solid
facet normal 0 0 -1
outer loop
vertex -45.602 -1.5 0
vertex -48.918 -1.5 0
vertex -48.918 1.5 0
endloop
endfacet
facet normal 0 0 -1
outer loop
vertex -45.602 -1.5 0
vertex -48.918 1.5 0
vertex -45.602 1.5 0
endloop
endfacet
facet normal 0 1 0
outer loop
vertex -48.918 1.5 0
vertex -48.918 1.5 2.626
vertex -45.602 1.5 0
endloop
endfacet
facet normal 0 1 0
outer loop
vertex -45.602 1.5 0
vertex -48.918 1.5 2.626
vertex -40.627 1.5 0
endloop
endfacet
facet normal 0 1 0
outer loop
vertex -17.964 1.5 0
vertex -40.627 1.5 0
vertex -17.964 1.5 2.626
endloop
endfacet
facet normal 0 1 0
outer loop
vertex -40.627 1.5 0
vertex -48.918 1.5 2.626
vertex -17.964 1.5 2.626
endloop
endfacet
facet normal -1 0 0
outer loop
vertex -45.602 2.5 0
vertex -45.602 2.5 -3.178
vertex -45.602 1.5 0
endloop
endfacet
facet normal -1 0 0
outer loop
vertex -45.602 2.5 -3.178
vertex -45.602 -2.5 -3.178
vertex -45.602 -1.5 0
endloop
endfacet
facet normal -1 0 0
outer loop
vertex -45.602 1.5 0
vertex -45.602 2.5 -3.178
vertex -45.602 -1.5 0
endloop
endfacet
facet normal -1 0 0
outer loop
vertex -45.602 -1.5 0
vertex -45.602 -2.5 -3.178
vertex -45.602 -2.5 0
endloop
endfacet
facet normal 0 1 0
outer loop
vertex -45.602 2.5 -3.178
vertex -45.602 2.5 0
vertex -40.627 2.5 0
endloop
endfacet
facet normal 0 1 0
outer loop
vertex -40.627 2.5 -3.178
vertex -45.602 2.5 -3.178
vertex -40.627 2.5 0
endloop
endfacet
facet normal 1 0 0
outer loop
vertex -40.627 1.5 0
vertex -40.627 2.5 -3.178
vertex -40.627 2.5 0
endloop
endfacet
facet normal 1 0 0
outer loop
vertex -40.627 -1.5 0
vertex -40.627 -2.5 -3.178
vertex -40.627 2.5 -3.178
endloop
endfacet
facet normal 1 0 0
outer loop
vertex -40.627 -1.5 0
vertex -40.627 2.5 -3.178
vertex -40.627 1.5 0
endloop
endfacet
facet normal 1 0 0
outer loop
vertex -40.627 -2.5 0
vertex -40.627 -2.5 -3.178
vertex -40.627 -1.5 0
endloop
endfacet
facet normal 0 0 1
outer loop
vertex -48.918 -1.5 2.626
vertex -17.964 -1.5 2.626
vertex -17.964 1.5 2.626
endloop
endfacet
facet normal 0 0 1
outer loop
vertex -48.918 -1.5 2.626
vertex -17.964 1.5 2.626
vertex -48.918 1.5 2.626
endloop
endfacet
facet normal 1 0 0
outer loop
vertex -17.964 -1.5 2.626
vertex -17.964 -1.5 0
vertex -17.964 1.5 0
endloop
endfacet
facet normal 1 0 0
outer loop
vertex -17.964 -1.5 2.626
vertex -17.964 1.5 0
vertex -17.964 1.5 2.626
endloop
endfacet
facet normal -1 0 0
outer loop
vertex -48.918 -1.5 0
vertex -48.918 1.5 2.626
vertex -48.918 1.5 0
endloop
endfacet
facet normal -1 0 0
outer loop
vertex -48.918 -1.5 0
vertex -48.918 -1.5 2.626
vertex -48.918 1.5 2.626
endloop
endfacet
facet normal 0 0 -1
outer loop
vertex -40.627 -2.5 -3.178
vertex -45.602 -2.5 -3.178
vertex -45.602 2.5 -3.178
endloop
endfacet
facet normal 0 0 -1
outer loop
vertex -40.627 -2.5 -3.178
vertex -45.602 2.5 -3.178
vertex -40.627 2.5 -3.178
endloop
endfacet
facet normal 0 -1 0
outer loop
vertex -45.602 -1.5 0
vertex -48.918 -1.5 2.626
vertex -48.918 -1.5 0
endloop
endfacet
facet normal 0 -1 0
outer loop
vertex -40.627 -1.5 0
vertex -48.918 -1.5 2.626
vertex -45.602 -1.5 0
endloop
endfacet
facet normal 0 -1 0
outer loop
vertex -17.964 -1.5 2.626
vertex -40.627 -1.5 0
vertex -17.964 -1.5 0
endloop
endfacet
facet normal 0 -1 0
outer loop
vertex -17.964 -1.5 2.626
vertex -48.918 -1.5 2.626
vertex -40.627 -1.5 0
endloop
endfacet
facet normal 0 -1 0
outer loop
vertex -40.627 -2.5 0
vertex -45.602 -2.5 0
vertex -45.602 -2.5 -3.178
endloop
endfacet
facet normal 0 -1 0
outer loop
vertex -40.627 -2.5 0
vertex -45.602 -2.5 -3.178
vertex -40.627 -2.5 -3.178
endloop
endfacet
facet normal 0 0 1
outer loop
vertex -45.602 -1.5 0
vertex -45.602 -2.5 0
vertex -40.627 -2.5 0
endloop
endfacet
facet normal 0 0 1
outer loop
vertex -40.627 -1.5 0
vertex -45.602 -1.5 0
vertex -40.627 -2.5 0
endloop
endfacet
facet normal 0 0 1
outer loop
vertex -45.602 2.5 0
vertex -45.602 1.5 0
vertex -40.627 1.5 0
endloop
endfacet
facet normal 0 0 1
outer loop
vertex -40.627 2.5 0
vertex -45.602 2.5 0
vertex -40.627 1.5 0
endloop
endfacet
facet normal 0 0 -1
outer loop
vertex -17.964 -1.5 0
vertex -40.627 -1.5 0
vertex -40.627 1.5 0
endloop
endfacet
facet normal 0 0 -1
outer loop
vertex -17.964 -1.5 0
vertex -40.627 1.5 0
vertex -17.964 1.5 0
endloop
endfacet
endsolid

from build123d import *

# Parameters (mm, degrees)
F1_DEPTH = 1.5
F2_W     = 4.974715
F2_H     = 3.17829
F3_DEPTH = 2.5


with BuildPart() as f1:
    # F0 (on Front) → F1 (new body, symmetric)
    with BuildSketch(Plane.XZ):
        Polygon((-48.918031, 0), (-43.666944, 0), (-17.964249, 0), (-17.964249, 2.625544), (-48.918031, 2.625544), align=None)
    extrude(amount=F1_DEPTH, both=True)

    # F2 (on Front) → F3 (join, symmetric)
    with BuildSketch(Plane.XZ):
        with Locations((-43.114196, -1.589145)):
            Rectangle(F2_W, F2_H)
    extrude(amount=F3_DEPTH, both=True)


solid = f1.part
